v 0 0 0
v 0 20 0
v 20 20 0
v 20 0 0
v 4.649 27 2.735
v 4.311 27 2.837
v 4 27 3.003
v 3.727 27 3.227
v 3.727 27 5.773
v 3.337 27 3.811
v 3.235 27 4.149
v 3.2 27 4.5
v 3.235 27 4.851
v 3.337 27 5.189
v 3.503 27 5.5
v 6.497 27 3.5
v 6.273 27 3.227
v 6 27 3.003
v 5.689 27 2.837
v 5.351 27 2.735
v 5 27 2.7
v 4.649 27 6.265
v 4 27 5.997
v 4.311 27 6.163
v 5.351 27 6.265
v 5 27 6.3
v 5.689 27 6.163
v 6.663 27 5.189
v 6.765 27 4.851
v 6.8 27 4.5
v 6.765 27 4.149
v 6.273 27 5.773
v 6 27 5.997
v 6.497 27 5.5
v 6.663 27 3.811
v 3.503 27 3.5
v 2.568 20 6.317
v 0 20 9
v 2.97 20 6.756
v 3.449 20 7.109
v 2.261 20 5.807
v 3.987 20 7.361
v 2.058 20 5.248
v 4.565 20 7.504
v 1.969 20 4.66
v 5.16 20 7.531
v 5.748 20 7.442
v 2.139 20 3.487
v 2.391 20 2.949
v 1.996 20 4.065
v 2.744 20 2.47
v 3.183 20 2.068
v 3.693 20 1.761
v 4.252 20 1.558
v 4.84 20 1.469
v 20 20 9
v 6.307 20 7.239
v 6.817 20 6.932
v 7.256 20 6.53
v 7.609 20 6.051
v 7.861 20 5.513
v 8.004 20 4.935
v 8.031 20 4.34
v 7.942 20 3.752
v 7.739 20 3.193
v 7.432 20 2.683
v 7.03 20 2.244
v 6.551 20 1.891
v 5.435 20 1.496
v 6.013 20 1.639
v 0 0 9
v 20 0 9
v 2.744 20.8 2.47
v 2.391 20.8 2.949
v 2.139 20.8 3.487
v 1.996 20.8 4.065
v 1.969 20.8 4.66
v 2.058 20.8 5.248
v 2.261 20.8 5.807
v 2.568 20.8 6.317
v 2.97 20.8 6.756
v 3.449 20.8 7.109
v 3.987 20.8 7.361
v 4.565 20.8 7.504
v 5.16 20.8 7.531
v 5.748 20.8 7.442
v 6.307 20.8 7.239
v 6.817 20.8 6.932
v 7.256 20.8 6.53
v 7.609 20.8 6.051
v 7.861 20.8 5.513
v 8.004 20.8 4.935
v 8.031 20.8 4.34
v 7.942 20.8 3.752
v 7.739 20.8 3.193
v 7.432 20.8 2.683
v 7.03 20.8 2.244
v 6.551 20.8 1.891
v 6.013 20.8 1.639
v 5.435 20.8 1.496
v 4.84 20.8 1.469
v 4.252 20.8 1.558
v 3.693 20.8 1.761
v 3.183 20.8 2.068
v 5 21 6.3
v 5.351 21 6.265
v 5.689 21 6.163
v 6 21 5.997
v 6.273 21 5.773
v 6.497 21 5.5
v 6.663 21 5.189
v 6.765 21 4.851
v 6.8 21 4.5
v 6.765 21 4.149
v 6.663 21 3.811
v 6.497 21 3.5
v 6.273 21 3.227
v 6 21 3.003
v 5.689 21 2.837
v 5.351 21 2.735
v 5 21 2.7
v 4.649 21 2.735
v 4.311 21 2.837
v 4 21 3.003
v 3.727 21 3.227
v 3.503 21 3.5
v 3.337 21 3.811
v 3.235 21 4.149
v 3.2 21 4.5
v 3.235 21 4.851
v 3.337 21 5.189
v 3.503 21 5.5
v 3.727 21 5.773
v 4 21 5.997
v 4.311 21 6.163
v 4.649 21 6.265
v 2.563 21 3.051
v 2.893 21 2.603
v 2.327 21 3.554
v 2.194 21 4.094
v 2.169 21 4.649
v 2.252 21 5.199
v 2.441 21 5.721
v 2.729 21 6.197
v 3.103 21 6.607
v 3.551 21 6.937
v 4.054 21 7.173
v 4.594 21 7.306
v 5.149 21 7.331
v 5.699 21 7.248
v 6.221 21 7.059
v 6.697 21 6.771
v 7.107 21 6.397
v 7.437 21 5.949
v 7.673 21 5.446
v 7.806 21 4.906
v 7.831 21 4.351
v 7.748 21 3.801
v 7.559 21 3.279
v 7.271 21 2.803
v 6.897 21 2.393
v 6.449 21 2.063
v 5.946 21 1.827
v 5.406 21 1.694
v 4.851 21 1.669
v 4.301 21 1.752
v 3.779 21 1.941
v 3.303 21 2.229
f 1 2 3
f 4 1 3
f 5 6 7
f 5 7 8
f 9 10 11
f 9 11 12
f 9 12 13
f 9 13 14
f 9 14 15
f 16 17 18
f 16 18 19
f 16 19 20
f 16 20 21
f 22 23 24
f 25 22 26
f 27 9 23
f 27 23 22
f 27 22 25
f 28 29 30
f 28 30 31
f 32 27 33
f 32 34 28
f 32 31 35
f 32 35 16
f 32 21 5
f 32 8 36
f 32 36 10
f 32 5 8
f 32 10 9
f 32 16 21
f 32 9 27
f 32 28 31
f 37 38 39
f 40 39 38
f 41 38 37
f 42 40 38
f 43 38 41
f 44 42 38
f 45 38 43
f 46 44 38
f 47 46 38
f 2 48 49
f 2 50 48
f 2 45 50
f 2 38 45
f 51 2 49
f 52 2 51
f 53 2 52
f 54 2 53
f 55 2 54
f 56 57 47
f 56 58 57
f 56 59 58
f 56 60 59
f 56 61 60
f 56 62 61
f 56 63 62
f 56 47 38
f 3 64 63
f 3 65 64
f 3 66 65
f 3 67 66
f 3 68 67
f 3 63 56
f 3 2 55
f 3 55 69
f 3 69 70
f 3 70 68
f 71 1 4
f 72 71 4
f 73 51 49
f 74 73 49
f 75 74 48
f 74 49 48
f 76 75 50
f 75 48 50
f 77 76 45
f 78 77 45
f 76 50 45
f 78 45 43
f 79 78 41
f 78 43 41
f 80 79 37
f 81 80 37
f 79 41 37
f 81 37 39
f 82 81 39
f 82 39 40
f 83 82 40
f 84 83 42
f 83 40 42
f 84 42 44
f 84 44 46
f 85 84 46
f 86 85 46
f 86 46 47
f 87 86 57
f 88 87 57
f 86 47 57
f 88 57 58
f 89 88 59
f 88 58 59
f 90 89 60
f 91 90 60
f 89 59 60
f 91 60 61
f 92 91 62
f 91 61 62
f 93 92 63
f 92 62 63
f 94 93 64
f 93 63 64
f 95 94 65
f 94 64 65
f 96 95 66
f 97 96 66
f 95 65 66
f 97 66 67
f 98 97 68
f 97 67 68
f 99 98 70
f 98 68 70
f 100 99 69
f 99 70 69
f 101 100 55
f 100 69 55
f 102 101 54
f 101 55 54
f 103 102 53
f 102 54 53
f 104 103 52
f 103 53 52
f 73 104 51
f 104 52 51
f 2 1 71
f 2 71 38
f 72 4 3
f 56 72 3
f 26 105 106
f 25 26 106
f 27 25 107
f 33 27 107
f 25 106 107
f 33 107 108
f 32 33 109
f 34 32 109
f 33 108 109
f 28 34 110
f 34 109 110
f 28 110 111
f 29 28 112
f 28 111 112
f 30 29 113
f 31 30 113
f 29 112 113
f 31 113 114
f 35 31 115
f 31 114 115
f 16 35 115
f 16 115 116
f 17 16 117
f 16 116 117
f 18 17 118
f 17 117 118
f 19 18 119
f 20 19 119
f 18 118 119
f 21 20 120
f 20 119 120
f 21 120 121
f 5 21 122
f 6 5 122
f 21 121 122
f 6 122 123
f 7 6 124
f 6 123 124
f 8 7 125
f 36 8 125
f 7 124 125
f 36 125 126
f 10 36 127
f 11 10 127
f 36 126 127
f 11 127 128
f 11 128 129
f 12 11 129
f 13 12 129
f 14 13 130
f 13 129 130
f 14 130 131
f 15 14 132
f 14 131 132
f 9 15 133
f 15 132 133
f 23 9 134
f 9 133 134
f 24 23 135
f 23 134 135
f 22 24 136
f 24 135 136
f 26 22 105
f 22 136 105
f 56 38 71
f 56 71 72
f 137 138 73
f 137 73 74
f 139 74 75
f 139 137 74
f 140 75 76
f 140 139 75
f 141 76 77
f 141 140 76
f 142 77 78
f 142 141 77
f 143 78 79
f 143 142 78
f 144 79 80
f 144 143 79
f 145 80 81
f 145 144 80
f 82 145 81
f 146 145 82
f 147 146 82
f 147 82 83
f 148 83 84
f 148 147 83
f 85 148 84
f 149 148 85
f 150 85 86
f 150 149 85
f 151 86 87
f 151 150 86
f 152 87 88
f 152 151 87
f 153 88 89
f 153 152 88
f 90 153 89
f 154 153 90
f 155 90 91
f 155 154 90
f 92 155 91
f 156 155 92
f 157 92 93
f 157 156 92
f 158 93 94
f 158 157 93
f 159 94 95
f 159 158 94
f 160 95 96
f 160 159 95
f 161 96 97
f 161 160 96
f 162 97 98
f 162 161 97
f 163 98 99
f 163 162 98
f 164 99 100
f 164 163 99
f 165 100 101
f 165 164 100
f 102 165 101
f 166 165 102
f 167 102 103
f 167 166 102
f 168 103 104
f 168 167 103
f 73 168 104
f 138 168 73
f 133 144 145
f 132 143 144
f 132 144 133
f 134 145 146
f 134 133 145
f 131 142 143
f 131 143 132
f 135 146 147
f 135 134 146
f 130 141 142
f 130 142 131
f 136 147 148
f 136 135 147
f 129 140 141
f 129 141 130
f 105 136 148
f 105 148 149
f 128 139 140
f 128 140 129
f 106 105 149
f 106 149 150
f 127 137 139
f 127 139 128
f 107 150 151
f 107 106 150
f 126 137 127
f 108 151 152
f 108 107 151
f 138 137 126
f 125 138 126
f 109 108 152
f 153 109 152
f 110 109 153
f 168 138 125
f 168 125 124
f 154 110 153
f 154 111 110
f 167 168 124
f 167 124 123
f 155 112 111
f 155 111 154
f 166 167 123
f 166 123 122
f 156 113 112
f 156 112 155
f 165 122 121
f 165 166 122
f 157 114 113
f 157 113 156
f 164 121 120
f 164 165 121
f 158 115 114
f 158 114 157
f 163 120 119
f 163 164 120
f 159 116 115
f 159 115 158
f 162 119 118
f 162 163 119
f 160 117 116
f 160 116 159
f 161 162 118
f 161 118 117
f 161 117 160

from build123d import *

# Parameters (mm, degrees)
ESQUISSE1_W        = 20
ESQUISSE1_H        = 20
BOSS_EXTRU_1_DEPTH = 9
BOSS_EXTRU_2_DEPTH = 1
CHANFREIN1_SIZE    = 0.2
ESQUISSE4_R        = 1.8000000000000007
BOSS_EXTRU_3_DEPTH = 6


with BuildPart() as part:
    # Esquisse1 → Boss.-Extru.1 (new body)
    with BuildSketch(Plane.XY):
        with Locations((10, 10)):
            Rectangle(ESQUISSE1_W, ESQUISSE1_H)
    extrude(amount=BOSS_EXTRU_1_DEPTH)

    # Esquisse2 → Boss.-Extru.2 (add)
    with BuildSketch(Plane(origin=(0, 20, 0), x_dir=(1, 0, 0), z_dir=(0, 1, 0))):
        with BuildLine():
            ThreePointArc((7.256081239041076, -2.4695268848630905), (5.0000000000000115, -1.4647531190285523), (2.7439187609589397, -2.469526884863073))
            Line((2.743918760958954, -2.4695268848630585), (5.000000000000001, -4.500000000000001))
            Line((5.000000000000001, -4.499999999999999), (7.256081239041048, -2.4695268848630567))
        make_face()
        with BuildLine():
            Line((5.000000000000001, -4.500000000000001), (2.743918760958954, -2.4695268848630585))
            ThreePointArc((2.7439187609589397, -2.469526884863073), (1.9647531190285523, -4.5), (2.743918760958939, -6.530473115136926))
            Line((2.743918760958954, -6.5304731151369415), (5.000000000000001, -4.499999999999999))
        make_face()
        with BuildLine():
            Line((7.256081239041048, -2.4695268848630567), (5.000000000000001, -4.499999999999999))
            Line((5.000000000000001, -4.500000000000001), (7.256081239041048, -6.530473115136943))
            ThreePointArc((7.256081239041075, -6.53047311513691), (7.833768442592348, -5.587418981908373), (8.035246880971448, -4.500000000000001))
            ThreePointArc((8.035246880971448, -4.5), (7.833768442592348, -3.412581018091629), (7.256081239041075, -2.46952688486309))
        make_face()
        with BuildLine():
            Line((7.256081239041048, -6.530473115136943), (5.000000000000001, -4.500000000000001))
            Line((5.000000000000001, -4.499999999999999), (2.743918760958954, -6.5304731151369415))
            ThreePointArc((2.743918760958939, -6.530473115136926), (5.000000000000011, -7.535246880971448), (7.256081239041075, -6.53047311513691))
        make_face()
    extrude(amount=BOSS_EXTRU_2_DEPTH)

    # Chanfrein1
    chanfrein1_edges = [part.edges().sort_by_distance(p)[0] for p in [
        (7.256081239041057, 21, 2.469526884863065),
    ]]
    chamfer(chanfrein1_edges, length=CHANFREIN1_SIZE)

    # Esquisse4 → Boss.-Extru.3 (add)
    with BuildSketch(Plane(origin=(0, 21, 0), x_dir=(1, 0, 0), z_dir=(0, 1, 0))):
        with Locations(Location((5, -4.5, 0), (0, 0, 270))):
            Circle(ESQUISSE4_R)
    extrude(amount=BOSS_EXTRU_3_DEPTH)


solid = part.part
